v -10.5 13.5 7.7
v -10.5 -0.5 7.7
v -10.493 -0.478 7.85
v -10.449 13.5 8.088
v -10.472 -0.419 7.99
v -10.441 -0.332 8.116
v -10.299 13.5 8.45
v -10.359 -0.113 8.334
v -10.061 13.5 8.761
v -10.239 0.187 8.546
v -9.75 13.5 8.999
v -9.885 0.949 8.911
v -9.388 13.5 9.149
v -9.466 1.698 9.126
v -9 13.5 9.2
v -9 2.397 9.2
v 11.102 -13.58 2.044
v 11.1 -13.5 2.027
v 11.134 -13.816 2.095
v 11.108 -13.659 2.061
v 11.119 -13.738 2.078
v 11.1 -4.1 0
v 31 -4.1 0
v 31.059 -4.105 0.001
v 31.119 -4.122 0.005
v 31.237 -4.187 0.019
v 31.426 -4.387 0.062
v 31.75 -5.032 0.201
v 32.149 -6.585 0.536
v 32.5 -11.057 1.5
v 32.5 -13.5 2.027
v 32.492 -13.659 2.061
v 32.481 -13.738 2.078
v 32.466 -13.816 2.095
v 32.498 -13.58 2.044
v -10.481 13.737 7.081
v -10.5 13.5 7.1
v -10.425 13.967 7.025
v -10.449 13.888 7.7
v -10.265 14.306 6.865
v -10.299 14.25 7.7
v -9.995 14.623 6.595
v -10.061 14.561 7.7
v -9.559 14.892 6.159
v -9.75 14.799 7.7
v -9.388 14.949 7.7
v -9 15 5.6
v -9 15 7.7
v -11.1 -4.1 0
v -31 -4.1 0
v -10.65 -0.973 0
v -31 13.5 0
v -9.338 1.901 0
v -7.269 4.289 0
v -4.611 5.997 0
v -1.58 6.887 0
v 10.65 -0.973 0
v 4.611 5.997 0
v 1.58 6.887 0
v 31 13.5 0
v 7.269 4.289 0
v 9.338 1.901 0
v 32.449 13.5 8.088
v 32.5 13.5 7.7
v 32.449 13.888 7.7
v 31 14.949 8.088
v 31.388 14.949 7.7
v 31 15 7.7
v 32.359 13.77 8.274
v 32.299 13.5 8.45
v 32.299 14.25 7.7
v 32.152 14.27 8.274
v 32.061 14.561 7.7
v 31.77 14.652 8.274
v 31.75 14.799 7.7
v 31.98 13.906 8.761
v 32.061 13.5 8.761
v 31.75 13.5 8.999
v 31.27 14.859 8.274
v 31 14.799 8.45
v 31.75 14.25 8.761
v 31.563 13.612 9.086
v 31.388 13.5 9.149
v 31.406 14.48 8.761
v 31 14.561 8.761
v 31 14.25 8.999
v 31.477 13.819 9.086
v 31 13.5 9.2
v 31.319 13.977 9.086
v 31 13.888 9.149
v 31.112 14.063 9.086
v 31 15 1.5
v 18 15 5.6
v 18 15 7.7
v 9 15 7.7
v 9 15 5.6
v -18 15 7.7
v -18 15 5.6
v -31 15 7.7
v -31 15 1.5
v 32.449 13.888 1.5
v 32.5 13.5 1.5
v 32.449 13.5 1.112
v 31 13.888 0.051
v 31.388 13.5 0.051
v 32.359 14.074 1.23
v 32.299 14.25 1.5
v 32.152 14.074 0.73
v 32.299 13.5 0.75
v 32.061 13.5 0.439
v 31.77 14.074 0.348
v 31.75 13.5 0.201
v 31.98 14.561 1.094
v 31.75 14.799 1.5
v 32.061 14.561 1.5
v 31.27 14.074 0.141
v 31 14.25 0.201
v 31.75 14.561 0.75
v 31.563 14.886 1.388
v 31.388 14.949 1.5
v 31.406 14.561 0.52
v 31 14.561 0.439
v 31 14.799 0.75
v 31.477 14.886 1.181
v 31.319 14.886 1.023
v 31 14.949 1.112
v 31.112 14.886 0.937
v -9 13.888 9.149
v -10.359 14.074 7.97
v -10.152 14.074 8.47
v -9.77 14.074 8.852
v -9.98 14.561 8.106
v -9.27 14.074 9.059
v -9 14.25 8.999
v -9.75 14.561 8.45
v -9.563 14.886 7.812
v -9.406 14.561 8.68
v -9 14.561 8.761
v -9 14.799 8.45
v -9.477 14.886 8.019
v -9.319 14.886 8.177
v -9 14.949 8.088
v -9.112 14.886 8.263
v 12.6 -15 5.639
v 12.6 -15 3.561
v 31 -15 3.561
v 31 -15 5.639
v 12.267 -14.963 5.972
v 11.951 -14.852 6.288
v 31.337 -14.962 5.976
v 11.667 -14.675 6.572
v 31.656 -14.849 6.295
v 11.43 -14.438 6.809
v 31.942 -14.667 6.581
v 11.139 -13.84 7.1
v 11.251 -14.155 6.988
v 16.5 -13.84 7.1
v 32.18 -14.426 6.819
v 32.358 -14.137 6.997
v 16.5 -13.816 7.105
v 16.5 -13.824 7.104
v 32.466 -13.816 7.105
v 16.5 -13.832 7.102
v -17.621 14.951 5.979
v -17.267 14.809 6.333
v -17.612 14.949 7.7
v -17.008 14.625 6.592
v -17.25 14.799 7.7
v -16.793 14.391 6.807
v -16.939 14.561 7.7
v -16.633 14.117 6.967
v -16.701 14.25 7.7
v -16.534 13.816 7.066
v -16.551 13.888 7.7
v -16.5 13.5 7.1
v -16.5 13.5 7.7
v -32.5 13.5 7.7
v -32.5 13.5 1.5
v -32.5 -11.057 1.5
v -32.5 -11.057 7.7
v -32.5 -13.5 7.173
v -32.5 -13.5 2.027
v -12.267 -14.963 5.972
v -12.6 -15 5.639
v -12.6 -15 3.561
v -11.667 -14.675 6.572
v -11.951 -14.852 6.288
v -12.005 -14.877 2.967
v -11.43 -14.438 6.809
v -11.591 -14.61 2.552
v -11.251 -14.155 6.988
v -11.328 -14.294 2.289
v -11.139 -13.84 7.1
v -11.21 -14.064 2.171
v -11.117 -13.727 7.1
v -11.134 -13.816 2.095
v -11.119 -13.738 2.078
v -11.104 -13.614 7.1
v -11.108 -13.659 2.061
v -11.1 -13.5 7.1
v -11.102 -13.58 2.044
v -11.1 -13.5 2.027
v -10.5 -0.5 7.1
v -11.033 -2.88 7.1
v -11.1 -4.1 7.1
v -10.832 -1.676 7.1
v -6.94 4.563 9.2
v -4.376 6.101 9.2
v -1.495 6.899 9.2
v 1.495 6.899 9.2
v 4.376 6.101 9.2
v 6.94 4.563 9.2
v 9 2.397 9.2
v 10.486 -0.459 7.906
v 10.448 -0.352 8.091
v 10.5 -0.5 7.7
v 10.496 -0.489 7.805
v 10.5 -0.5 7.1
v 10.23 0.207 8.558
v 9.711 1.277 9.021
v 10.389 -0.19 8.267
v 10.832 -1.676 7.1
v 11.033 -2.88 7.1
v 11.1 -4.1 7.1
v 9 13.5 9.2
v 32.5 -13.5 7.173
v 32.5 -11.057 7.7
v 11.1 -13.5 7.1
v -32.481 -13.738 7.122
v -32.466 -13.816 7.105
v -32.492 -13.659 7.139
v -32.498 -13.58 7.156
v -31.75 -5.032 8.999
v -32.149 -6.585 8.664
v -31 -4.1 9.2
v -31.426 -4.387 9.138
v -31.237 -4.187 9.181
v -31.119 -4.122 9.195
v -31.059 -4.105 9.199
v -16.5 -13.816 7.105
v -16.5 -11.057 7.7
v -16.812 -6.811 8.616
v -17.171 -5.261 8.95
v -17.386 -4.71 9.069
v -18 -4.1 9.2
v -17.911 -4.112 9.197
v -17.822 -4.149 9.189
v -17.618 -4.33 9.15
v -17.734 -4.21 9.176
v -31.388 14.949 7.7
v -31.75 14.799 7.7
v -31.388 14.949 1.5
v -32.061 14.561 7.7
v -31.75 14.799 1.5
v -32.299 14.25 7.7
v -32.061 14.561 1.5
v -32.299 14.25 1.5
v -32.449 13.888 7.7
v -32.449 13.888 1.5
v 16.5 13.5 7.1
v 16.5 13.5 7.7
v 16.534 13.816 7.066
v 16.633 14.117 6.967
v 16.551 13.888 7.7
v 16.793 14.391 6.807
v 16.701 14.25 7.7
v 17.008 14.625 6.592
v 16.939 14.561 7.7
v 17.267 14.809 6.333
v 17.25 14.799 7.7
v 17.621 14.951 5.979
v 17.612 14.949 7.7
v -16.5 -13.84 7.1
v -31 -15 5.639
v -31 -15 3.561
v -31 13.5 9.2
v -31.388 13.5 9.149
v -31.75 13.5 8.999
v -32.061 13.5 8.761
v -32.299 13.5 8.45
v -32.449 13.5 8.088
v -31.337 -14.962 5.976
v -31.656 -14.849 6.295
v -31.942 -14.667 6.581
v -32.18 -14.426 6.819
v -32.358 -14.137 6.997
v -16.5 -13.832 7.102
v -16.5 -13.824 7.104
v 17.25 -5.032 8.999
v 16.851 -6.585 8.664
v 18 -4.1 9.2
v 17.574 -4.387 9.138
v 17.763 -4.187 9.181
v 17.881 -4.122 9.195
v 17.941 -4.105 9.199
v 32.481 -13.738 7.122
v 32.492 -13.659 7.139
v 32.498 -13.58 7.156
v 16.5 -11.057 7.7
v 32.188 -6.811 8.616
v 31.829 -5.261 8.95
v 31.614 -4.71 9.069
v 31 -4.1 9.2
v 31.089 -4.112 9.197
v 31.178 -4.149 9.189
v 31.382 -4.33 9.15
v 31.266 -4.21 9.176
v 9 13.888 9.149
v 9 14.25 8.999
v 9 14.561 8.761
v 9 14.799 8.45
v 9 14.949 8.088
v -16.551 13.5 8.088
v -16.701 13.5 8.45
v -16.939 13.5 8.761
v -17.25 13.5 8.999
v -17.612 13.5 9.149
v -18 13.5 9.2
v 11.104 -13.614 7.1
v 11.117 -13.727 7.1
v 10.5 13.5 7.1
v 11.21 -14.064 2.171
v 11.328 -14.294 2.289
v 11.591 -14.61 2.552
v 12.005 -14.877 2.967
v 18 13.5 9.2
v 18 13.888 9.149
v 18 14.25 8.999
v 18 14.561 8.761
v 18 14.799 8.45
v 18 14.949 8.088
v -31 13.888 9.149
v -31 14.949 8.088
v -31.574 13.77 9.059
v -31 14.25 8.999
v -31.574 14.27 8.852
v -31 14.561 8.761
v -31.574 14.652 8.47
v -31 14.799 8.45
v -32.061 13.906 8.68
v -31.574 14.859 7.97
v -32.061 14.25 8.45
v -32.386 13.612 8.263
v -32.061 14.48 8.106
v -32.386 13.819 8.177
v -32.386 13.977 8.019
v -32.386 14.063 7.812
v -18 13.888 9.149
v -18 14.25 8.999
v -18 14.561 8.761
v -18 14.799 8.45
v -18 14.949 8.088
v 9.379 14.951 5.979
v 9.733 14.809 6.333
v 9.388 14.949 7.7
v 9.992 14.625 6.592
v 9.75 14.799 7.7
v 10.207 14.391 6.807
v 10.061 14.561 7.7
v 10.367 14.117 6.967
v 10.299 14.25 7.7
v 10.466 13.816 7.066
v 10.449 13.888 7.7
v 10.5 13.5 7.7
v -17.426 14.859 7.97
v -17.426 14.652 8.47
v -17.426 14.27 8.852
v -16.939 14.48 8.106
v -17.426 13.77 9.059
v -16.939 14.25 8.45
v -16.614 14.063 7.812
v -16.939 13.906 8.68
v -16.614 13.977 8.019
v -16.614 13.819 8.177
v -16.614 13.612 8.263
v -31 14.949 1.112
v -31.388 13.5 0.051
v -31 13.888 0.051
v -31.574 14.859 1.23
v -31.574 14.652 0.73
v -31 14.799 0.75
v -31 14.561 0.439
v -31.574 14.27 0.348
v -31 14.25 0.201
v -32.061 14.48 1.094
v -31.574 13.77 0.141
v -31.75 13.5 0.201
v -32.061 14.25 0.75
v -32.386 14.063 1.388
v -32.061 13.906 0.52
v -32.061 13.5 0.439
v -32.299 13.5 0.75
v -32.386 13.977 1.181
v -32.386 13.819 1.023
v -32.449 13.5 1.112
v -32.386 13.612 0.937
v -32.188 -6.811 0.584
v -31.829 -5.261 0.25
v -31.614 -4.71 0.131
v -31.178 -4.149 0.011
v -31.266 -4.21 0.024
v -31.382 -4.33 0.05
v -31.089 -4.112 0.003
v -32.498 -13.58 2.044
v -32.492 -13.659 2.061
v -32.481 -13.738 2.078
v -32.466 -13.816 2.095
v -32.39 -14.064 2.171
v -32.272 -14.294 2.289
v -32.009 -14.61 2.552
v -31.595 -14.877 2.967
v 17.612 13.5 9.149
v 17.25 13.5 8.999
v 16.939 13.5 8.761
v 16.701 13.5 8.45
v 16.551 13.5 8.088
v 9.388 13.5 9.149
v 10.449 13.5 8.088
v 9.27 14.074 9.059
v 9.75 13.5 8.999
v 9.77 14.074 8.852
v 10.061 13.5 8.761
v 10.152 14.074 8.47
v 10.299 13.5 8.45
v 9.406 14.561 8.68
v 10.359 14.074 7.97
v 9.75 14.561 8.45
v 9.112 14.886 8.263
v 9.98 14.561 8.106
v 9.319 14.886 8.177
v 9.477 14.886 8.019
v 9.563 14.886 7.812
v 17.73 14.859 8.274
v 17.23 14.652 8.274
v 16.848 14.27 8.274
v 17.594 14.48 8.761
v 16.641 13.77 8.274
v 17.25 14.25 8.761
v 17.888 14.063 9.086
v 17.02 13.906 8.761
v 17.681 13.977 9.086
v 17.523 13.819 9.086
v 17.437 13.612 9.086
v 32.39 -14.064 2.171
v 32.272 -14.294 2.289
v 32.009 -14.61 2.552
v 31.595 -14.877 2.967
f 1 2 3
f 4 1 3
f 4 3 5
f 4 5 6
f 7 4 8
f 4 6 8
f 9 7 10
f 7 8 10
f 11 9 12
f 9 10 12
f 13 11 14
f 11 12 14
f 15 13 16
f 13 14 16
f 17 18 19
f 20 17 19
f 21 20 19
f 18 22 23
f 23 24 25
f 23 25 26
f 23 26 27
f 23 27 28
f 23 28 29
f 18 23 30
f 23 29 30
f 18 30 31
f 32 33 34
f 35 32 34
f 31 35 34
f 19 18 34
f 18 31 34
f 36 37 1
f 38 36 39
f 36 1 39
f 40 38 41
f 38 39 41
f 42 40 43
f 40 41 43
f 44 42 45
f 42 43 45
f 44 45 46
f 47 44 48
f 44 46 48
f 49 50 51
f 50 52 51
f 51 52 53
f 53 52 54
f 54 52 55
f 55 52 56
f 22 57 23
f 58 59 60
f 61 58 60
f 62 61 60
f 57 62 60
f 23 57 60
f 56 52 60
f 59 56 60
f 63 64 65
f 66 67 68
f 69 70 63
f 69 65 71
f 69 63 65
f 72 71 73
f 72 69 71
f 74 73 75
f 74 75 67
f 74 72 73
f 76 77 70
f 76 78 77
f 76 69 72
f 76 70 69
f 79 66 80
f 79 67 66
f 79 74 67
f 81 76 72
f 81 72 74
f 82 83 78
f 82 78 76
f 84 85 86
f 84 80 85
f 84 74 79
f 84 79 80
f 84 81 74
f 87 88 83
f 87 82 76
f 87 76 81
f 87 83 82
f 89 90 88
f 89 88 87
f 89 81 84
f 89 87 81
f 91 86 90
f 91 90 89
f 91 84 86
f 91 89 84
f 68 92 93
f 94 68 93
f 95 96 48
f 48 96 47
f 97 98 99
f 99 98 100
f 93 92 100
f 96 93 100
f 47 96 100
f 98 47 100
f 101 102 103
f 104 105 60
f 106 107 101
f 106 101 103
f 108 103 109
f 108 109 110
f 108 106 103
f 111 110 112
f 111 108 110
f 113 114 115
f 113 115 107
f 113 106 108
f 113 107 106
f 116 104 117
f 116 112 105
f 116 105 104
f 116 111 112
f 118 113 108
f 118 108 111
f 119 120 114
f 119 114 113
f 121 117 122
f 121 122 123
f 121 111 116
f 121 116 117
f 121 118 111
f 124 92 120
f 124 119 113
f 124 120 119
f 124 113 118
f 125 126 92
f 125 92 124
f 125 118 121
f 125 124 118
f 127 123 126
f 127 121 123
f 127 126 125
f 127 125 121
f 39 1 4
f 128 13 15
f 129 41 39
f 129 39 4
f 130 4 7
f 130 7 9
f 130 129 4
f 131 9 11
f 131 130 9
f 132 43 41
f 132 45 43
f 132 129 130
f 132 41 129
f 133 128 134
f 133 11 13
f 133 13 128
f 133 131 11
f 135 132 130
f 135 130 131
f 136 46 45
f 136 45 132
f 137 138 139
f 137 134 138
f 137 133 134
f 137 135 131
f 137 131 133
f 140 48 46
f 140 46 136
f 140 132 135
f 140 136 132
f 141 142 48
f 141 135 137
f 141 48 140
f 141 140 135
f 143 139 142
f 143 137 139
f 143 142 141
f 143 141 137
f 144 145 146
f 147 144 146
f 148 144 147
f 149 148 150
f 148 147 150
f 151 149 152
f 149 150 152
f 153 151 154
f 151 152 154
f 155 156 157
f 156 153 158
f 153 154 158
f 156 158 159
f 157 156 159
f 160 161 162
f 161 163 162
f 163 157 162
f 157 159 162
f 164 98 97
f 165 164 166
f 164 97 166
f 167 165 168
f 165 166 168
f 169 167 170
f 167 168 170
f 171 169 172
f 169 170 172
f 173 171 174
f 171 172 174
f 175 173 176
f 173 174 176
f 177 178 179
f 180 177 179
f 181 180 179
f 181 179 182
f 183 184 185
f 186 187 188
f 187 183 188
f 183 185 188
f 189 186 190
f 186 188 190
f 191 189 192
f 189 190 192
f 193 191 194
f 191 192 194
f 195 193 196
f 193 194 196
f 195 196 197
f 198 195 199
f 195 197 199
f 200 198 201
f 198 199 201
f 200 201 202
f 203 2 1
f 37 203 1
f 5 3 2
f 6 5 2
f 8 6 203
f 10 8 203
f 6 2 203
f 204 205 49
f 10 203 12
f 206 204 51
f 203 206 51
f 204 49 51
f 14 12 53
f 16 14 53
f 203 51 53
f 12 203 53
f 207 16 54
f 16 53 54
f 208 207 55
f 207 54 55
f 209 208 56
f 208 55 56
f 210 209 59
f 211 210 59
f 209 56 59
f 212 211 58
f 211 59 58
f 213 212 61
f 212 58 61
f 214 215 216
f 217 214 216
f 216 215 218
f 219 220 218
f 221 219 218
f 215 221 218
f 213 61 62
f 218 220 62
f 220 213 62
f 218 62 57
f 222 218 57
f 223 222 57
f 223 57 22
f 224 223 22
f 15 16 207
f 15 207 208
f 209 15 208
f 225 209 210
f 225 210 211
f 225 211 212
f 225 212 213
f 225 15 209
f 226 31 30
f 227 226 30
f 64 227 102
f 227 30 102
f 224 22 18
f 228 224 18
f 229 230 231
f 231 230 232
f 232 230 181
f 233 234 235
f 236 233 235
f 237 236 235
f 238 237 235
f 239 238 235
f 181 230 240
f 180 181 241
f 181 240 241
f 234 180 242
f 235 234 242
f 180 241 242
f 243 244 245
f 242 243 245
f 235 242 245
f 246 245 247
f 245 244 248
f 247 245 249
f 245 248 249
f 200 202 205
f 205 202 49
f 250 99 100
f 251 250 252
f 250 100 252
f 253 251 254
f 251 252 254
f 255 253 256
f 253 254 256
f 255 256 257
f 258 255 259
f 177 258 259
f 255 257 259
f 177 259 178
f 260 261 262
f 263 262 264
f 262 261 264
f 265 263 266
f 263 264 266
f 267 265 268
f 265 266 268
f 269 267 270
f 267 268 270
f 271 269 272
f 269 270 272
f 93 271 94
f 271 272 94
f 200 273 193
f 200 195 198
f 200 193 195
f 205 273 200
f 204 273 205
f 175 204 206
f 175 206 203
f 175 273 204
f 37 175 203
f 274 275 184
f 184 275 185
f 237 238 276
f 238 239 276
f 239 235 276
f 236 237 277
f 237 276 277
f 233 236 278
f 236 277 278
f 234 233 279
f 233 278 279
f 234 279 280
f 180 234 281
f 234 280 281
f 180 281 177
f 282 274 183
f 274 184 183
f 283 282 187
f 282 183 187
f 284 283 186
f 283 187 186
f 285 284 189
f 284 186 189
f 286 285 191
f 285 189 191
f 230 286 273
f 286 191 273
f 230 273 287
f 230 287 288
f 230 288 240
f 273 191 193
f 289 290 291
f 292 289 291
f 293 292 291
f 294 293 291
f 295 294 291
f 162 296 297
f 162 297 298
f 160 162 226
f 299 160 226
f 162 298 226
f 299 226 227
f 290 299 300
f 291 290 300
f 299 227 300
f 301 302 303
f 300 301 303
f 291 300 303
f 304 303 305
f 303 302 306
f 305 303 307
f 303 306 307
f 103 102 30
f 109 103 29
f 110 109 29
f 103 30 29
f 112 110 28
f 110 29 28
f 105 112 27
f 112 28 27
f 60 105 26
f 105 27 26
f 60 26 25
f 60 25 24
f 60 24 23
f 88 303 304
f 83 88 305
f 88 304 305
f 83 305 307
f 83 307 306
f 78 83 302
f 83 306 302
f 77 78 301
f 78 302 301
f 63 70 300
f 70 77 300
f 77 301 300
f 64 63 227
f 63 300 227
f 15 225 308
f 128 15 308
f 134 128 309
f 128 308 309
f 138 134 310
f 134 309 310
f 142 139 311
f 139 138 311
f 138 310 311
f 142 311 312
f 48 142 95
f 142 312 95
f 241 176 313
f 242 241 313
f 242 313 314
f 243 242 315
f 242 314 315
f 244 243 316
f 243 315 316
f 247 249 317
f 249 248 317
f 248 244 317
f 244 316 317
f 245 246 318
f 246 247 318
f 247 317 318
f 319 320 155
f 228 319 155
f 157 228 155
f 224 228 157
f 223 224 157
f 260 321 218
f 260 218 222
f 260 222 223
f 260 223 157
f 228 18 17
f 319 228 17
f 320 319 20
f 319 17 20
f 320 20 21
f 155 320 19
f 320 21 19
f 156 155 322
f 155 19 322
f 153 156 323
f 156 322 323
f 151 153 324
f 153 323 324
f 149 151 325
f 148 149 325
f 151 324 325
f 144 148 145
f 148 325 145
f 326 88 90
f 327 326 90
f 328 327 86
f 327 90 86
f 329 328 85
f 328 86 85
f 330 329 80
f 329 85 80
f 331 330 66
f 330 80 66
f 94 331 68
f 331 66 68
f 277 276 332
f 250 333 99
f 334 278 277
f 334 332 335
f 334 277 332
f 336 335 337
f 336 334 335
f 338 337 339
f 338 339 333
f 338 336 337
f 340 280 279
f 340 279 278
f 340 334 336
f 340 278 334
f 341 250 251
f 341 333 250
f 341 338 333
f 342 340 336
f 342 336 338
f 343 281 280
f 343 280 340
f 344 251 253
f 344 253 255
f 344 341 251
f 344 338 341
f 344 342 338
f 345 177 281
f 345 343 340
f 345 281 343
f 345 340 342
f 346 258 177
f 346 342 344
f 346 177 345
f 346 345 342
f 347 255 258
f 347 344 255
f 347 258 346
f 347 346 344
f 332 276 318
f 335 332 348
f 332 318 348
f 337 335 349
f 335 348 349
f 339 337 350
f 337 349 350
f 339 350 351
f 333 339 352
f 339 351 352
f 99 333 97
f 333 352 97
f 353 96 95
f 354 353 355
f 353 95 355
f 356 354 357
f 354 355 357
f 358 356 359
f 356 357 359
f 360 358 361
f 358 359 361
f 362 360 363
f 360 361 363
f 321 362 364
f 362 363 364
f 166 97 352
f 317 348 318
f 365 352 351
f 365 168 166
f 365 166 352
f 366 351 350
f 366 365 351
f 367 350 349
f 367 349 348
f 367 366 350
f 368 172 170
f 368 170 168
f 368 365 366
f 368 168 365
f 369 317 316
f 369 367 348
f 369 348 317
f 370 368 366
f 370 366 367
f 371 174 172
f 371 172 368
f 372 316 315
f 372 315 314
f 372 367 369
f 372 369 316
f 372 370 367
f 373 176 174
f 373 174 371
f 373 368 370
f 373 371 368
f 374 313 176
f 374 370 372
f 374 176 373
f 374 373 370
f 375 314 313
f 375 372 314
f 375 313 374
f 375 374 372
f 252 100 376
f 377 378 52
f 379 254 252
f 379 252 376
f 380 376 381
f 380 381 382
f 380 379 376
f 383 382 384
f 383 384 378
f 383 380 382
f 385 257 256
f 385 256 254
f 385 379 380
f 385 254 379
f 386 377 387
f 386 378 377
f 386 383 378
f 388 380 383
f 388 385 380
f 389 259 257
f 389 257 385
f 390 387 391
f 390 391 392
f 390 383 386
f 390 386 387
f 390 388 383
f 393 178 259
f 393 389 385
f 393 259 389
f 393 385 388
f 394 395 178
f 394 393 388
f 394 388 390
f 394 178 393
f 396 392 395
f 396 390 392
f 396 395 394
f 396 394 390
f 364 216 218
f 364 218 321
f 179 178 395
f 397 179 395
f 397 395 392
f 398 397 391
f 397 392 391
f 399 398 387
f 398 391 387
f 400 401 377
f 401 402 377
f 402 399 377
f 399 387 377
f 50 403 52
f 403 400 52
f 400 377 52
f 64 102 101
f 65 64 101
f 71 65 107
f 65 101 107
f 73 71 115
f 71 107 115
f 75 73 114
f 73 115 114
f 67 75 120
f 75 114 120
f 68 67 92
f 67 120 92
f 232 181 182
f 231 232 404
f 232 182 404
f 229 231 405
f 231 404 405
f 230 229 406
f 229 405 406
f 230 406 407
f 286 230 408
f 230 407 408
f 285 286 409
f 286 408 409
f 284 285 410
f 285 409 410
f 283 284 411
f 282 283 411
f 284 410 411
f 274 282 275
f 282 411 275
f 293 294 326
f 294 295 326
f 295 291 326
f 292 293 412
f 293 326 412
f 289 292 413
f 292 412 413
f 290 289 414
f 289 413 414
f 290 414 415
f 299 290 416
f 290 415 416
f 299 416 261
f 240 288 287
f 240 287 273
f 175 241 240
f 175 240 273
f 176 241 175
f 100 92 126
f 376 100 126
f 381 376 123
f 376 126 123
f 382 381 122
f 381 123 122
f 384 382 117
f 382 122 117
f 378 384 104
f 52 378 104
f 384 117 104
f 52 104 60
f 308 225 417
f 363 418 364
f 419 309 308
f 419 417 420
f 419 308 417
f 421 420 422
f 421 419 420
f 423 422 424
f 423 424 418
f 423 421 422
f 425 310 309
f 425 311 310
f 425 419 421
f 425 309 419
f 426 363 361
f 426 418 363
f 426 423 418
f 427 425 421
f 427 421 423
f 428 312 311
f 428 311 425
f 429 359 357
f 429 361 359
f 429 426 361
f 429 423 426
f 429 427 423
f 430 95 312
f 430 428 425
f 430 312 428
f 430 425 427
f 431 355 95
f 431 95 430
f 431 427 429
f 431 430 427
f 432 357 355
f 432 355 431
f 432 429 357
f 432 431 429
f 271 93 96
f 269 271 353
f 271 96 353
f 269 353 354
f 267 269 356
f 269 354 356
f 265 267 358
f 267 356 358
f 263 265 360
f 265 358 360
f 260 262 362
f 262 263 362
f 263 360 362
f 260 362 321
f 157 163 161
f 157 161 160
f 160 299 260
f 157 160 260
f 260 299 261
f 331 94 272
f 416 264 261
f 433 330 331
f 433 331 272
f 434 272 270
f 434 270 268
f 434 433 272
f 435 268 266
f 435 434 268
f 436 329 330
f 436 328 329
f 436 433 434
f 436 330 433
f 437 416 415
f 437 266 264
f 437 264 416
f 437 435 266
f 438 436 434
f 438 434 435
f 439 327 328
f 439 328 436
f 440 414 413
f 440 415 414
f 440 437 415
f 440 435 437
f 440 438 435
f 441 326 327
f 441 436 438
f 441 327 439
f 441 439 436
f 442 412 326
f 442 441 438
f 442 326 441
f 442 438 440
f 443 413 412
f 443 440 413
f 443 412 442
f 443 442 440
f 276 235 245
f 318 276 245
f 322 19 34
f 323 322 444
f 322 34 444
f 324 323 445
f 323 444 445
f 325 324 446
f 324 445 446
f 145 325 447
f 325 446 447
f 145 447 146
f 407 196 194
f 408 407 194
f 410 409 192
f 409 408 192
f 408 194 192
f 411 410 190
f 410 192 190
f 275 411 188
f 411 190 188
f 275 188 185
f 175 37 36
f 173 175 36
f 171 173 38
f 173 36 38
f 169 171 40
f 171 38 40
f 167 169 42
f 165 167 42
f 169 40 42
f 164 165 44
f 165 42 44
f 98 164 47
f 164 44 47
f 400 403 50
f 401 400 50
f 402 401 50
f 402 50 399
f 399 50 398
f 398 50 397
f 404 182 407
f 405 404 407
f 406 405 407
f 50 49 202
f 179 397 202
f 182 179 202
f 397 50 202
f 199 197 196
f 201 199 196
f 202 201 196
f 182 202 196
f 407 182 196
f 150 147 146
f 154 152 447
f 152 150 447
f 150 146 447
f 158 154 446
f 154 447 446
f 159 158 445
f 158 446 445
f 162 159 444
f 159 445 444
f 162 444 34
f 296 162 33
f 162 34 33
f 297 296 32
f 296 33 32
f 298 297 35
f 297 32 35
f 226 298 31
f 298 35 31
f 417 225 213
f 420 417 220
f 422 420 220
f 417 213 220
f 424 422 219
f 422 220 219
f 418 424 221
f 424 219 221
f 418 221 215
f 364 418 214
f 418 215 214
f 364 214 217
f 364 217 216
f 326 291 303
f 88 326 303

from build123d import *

# Parameters (mm, degrees)
EXTRUDE_1_DEPTH     = 9.2
SKETCH_3_W          = 6
SKETCH_3_H          = 30
CUT_EXTRUDE_2_DEPTH = 2.1
CUT_EXTRUDE_1_REACH = 69.34
FILLET_1_R          = 1.5


with BuildPart() as part:
    # 凸台-拉伸1: read off the stored shape, not the designer's step
    # 凸台-拉伸1 outline → 凸台-拉伸1 (new body)
    with BuildSketch(Plane.XY):
        with BuildLine():
            Line((11.1, -15), (32.5, -15))
            Line((32.5, -15), (32.5, 15))
            Line((32.5, 15), (-32.5, 15))
            Line((-32.5, 15), (-32.5, -15))
            Line((-32.5, -15), (-11.1, -15))
            Line((-11.1, -15), (-11.1, -4.1))
            ThreePointArc((-11.1, -4.1), (0, 7), (11.1, -4.1))
            Line((11.1, -4.1), (11.1, -15))
        make_face()
    extrude(amount=EXTRUDE_1_DEPTH)

    # 草图3 → 切除-拉伸2 (cut)
    with BuildSketch(Plane.XY.offset(9.2)):
        with Locations((-13.5, 0)):
            Rectangle(SKETCH_3_W, SKETCH_3_H)
        with Locations((13.5, 0)):
            Rectangle(SKETCH_3_W, SKETCH_3_H)
    extrude(amount=-CUT_EXTRUDE_2_DEPTH, mode=Mode.SUBTRACT)

    # 切除-拉伸1: up to this face of the body (flat: up to its plane)
    cut_extrude_1_end = Plane(part.part.faces().sort_by_distance((-32.5, 0, 4.6))[0])
    # 草图2 → 切除-拉伸1 (cut, up to the picked face)
    with BuildSketch(Plane(origin=(32.5, 0, 0), x_dir=(0, 0, -1), z_dir=(1, 0, 0)), mode=Mode.PRIVATE) as cut_extrude_1_sk1:
        Polygon((-6.85, -15), (-9.2, -4.1), (-9.2, -15), align=None)
    cut_extrude_1_tool1 = split(extrude(cut_extrude_1_sk1.sketch, amount=-CUT_EXTRUDE_1_REACH, mode=Mode.PRIVATE), bisect_by=cut_extrude_1_end, keep=Keep.BOTH, mode=Mode.PRIVATE)
    # 草图2 → 切除-拉伸1 (cut, up to the picked face)
    with BuildSketch(Plane(origin=(32.5, 0, 0), x_dir=(0, 0, -1), z_dir=(1, 0, 0)), mode=Mode.PRIVATE) as cut_extrude_1_sk2:
        Polygon((0, -4.1), (-2.35, -15), (0, -15), align=None)
    cut_extrude_1_tool2 = split(extrude(cut_extrude_1_sk2.sketch, amount=-CUT_EXTRUDE_1_REACH, mode=Mode.PRIVATE), bisect_by=cut_extrude_1_end, keep=Keep.BOTH, mode=Mode.PRIVATE)
    add(cut_extrude_1_tool1.solids().sort_by(Axis((32.5, -11.366667, 8.416667), (-1, 0, 0)))[0], mode=Mode.SUBTRACT)
    add(cut_extrude_1_tool2.solids().sort_by(Axis((32.5, -11.366667, 0.783333), (-1, 0, 0)))[0], mode=Mode.SUBTRACT)

    # 圆角1
    # the kernel refuses this fillet: 1.5 mm, written as the material it takes off along each edge
    with BuildSketch(Plane(origin=(-31, 13.5, 7.7), x_dir=(0, 0, 1), z_dir=(-1, 0, 0))) as fillet_1_piece_1_section:
        Polygon((0, 0), (FILLET_1_R, 0), (FILLET_1_R, FILLET_1_R), (0, FILLET_1_R), align=None)
    fillet_1_piece_1 = extrude(amount=FILLET_1_R, mode=Mode.PRIVATE)
    fillet_1_piece_1 = fillet_1_piece_1 - Plane(origin=(-31, 13.5, 7.7), x_dir=(0, -0.7071067811865475, -0.7071067811865475), z_dir=(-1, 0, 0)) * Sphere(FILLET_1_R, mode=Mode.PRIVATE)
    add(fillet_1_piece_1, mode=Mode.SUBTRACT)
    with BuildSketch(Plane(origin=(-31, 13.5, 1.5), x_dir=(0, 1, 0), z_dir=(-1, 0, 0))) as fillet_1_piece_2_section:
        Polygon((0, 0), (FILLET_1_R, 0), (FILLET_1_R, FILLET_1_R), (0, FILLET_1_R), align=None)
    fillet_1_piece_2 = extrude(amount=FILLET_1_R, mode=Mode.PRIVATE)
    fillet_1_piece_2 = fillet_1_piece_2 - Plane(origin=(-31, 13.5, 1.5), x_dir=(0, -0.7071067811865475, 0.7071067811865475), z_dir=(-1, 0, 0)) * Sphere(FILLET_1_R, mode=Mode.PRIVATE)
    add(fillet_1_piece_2, mode=Mode.SUBTRACT)
    with BuildSketch(Plane(origin=(31, 13.5, 1.5), x_dir=(1, 0, 0), z_dir=(0, 1, 0))) as fillet_1_piece_3_section:
        Polygon((0, 0), (FILLET_1_R, 0), (FILLET_1_R, FILLET_1_R), (0, FILLET_1_R), align=None)
    fillet_1_piece_3 = extrude(amount=FILLET_1_R, mode=Mode.PRIVATE)
    fillet_1_piece_3 = fillet_1_piece_3 - Plane(origin=(31, 13.5, 1.5), x_dir=(-0.7071067811865475, 0, 0.7071067811865475), z_dir=(0, 1, 0)) * Sphere(FILLET_1_R, mode=Mode.PRIVATE)
    add(fillet_1_piece_3, mode=Mode.SUBTRACT)
    with BuildSketch(Plane(origin=(31, 13.5, 7.7), x_dir=(0, 1, 0), z_dir=(0, 0, 1))) as fillet_1_piece_4_section:
        Polygon((0, 0), (FILLET_1_R, 0), (FILLET_1_R, -FILLET_1_R), (0, -FILLET_1_R), align=None)
    fillet_1_piece_4 = extrude(amount=FILLET_1_R, mode=Mode.PRIVATE)
    fillet_1_piece_4 = fillet_1_piece_4 - Plane(origin=(31, 13.5, 7.7), x_dir=(-0.7071067811865475, -0.7071067811865475, 0), z_dir=(0, 0, 1)) * Sphere(FILLET_1_R, mode=Mode.PRIVATE)
    add(fillet_1_piece_4, mode=Mode.SUBTRACT)
    with BuildSketch(Plane(origin=(18, 13.5, 7.7), x_dir=(-1, 0, 0), z_dir=(0, 0, 1))) as fillet_1_piece_5_section:
        Polygon((0, 0), (FILLET_1_R, 0), (FILLET_1_R, -FILLET_1_R), (0, -FILLET_1_R), align=None)
    fillet_1_piece_5 = extrude(amount=FILLET_1_R, mode=Mode.PRIVATE)
    fillet_1_piece_5 = fillet_1_piece_5 - Plane(origin=(18, 13.5, 7.7), x_dir=(0.7071067811865476, -0.7071067811865475, 0), z_dir=(0, 0, 1)) * Sphere(FILLET_1_R, mode=Mode.PRIVATE)
    add(fillet_1_piece_5, mode=Mode.SUBTRACT)
    with BuildSketch(Plane(origin=(-18, 13.5, 7.7), x_dir=(0, 1, 0), z_dir=(1, 0, 0))) as fillet_1_piece_6_section:
        Polygon((0, 0), (FILLET_1_R, 0), (FILLET_1_R, FILLET_1_R), (0, FILLET_1_R), align=None)
    fillet_1_piece_6 = extrude(amount=FILLET_1_R, mode=Mode.PRIVATE)
    fillet_1_piece_6 = fillet_1_piece_6 - Plane(origin=(-18, 13.5, 7.7), x_dir=(0, -0.7071067811865475, -0.7071067811865475), z_dir=(1, 0, 0)) * Sphere(FILLET_1_R, mode=Mode.PRIVATE)
    add(fillet_1_piece_6, mode=Mode.SUBTRACT)
    with BuildSketch(Plane(origin=(-9, 13.5, 7.7), x_dir=(0, 0, 1), z_dir=(0, 1, 0))) as fillet_1_piece_7_section:
        Polygon((0, 0), (FILLET_1_R, 0), (FILLET_1_R, -FILLET_1_R), (0, -FILLET_1_R), align=None)
    fillet_1_piece_7 = extrude(amount=FILLET_1_R, mode=Mode.PRIVATE)
    fillet_1_piece_7 = fillet_1_piece_7 - Plane(origin=(-9, 13.5, 7.7), x_dir=(0.7071067811865475, 0, -0.7071067811865475), z_dir=(0, 1, 0)) * Sphere(FILLET_1_R, mode=Mode.PRIVATE)
    add(fillet_1_piece_7, mode=Mode.SUBTRACT)
    with BuildSketch(Plane(origin=(9, 13.5, 7.7), x_dir=(1, 0, 0), z_dir=(0, 1, 0))) as fillet_1_piece_8_section:
        Polygon((0, 0), (FILLET_1_R, 0), (FILLET_1_R, -FILLET_1_R), (0, -FILLET_1_R), align=None)
    fillet_1_piece_8 = extrude(amount=FILLET_1_R, mode=Mode.PRIVATE)
    fillet_1_piece_8 = fillet_1_piece_8 - Plane(origin=(9, 13.5, 7.7), x_dir=(-0.7071067811865475, 0, -0.7071067811865475), z_dir=(0, 1, 0)) * Sphere(FILLET_1_R, mode=Mode.PRIVATE)
    add(fillet_1_piece_8, mode=Mode.SUBTRACT)
    with BuildSketch(Plane(origin=(-8.072322791, -15, 6.85), x_dir=(0, 0.9775391614749971, 0.2107538559143334), z_dir=(-1, 0, 0))) as fillet_1_piece_9:
        with BuildLine():
            CenterArc((FILLET_1_R * 0.807380589126, FILLET_1_R), FILLET_1_R, 192.166533775, 77.833466225)
            Line((-FILLET_1_R * 0.170158572349, FILLET_1_R * 0.789246144086), (0, 0))
            Line((0, 0), (FILLET_1_R * 0.807380589126, 0))
        make_face()
    extrude(amount=27.455354418, mode=Mode.SUBTRACT)
    with BuildSketch(Plane(origin=(-8.072322791, -15, 2.35), x_dir=(0, 0.977539161474997, -0.21075385591433374), z_dir=(-1, 0, 0)), Plane(origin=(35.527677209, -15, 6.85), x_dir=(0, 0, -1), z_dir=(-1, 0, 0)), Plane(origin=(35.527677209, -15, 2.35), x_dir=(0, 0.977539161474997, -0.21075385591433374), z_dir=(-1, 0, 0))) as fillet_1_piece_10:
        with BuildLine():
            CenterArc((FILLET_1_R * 0.807380589126, -FILLET_1_R), FILLET_1_R, 90, 77.833466225)
            Line((-FILLET_1_R * 0.170158572349, -FILLET_1_R * 0.789246144086), (0, 0))
            Line((0, 0), (FILLET_1_R * 0.807380589126, 0))
        make_face()
    extrude(amount=27.455354418, mode=Mode.SUBTRACT)
    with BuildSketch(Plane(origin=(-11.1, -15, -1.4), x_dir=(0, 1, 0), z_dir=(0, 0, 1))) as fillet_1_piece_11:
        with BuildLine():
            CenterArc((FILLET_1_R, FILLET_1_R), FILLET_1_R, 180, 90)
            Line((0, FILLET_1_R), (0, 0))
            Line((0, 0), (FILLET_1_R, 0))
        make_face()
    extrude(amount=12, mode=Mode.SUBTRACT)
    with BuildSketch(Plane(origin=(11.1, -15, -1.4), x_dir=(0, 1, 0), z_dir=(0, 0, 1)), Plane(origin=(32.5, -15, -1.4), x_dir=(-1, 0, 0), z_dir=(0, 0, 1)), Plane(origin=(-32.5, -15, -1.4), x_dir=(0, 1, 0), z_dir=(0, 0, 1))) as fillet_1_piece_12:
        with BuildLine():
            CenterArc((FILLET_1_R, -FILLET_1_R), FILLET_1_R, 90, 90)
            Line((0, -FILLET_1_R), (0, 0))
            Line((0, 0), (FILLET_1_R, 0))
        make_face()
    extrude(amount=12, mode=Mode.SUBTRACT)
    with BuildSketch(Plane(origin=(-32.5, 13.5, 9.2), x_dir=(0, 0, -1), z_dir=(0, -1, 0)), Plane(origin=(-32.5, 13.5, 0), x_dir=(1, 0, 0), z_dir=(0, -1, 0)), Plane(origin=(32.5, -15.35, 9.2), x_dir=(0, 0, -1), z_dir=(0, 1, 0)), Plane(origin=(-16.5, 13.5, 9.2), x_dir=(-1, 0, 0), z_dir=(0, -1, 0))) as fillet_1_piece_13:
        with BuildLine():
            CenterArc((FILLET_1_R, FILLET_1_R), FILLET_1_R, 180, 90)
            Line((0, FILLET_1_R), (0, 0))
            Line((0, 0), (FILLET_1_R, 0))
        make_face()
    extrude(amount=28.85, mode=Mode.SUBTRACT)
    with BuildSketch(Plane(origin=(32.5, -15.35, 0), x_dir=(0, 0, 1), z_dir=(0, 1, 0)), Plane(origin=(16.5, 13.5, 9.2), x_dir=(1, 0, 0), z_dir=(0, -1, 0))) as fillet_1_piece_14:
        with BuildLine():
            CenterArc((FILLET_1_R, -FILLET_1_R), FILLET_1_R, 90, 90)
            Line((0, -FILLET_1_R), (0, 0))
            Line((0, 0), (FILLET_1_R, 0))
        make_face()
    extrude(amount=28.85, mode=Mode.SUBTRACT)
    with BuildSketch(Plane(origin=(32.5, 15, 1.5), x_dir=(0, -1, 0), z_dir=(0, 0, 1)), Plane(origin=(-32.5, 15, 1.5), x_dir=(1, 0, 0), z_dir=(0, 0, 1))) as fillet_1_piece_15:
        with BuildLine():
            CenterArc((FILLET_1_R, -FILLET_1_R), FILLET_1_R, 90, 90)
            Line((0, -FILLET_1_R), (0, 0))
            Line((0, 0), (FILLET_1_R, 0))
        make_face()
    extrude(amount=6.2, mode=Mode.SUBTRACT)
    with BuildSketch(Plane(origin=(31, 15, 0), x_dir=(0, -1, 0), z_dir=(-1, 0, 0))) as fillet_1_piece_16:
        with BuildLine():
            CenterArc((FILLET_1_R, FILLET_1_R), FILLET_1_R, 180, 90)
            Line((0, FILLET_1_R), (0, 0))
            Line((0, 0), (FILLET_1_R, 0))
        make_face()
    extrude(amount=62, mode=Mode.SUBTRACT)
    with BuildSketch(Plane(origin=(31, 15, 9.2), x_dir=(0, -1, 0), z_dir=(-1, 0, 0))) as fillet_1_piece_17:
        with BuildLine():
            CenterArc((FILLET_1_R, -FILLET_1_R), FILLET_1_R, 90, 90)
            Line((0, -FILLET_1_R), (0, 0))
            Line((0, 0), (FILLET_1_R, 0))
        make_face()
    extrude(amount=13, mode=Mode.SUBTRACT)
    with BuildSketch(Plane(origin=(-18, 15, 9.2), x_dir=(0, 0, -1), z_dir=(-1, 0, 0))) as fillet_1_piece_18:
        with BuildLine():
            CenterArc((FILLET_1_R, FILLET_1_R), FILLET_1_R, 180, 90)
            Line((0, FILLET_1_R), (0, 0))
            Line((0, 0), (FILLET_1_R, 0))
        make_face()
    extrude(amount=13, mode=Mode.SUBTRACT)
    with BuildSketch(Plane(origin=(-10.5, -4.25, 9.2), x_dir=(1, 0, 0), z_dir=(0, 1, 0)), Plane(origin=(10.5, -4.25, 9.2), x_dir=(0, 0, -1), z_dir=(0, 1, 0))) as fillet_1_piece_19:
        with BuildLine():
            CenterArc((FILLET_1_R, FILLET_1_R), FILLET_1_R, 180, 90)
            Line((0, FILLET_1_R), (0, 0))
            Line((0, 0), (FILLET_1_R, 0))
        make_face()
    extrude(amount=17.75, mode=Mode.SUBTRACT)
    with BuildSketch(Plane(origin=(16.5, 15, 7.7), x_dir=(0, -1, 0), z_dir=(0, 0, -1)), Plane(origin=(10.5, 15, 7.7), x_dir=(-1, 0, 0), z_dir=(0, 0, -1)), Plane(origin=(-16.5, 15, 7.7), x_dir=(-1, 0, 0), z_dir=(0, 0, -1))) as fillet_1_piece_20:
        with BuildLine():
            CenterArc((FILLET_1_R, -FILLET_1_R), FILLET_1_R, 90, 90)
            Line((0, -FILLET_1_R), (0, 0))
            Line((0, 0), (FILLET_1_R, 0))
        make_face()
    extrude(amount=0.6, mode=Mode.SUBTRACT)
    with BuildSketch(Plane(origin=(10.5, 15, 7.1), x_dir=(0, -1, 0), z_dir=(1, 0, 0)), Plane(origin=(-10.5, 15, 7.1), x_dir=(0, 0, -1), z_dir=(-1, 0, 0))) as fillet_1_piece_21:
        with BuildLine():
            CenterArc((FILLET_1_R, FILLET_1_R), FILLET_1_R, 180, 90)
            Line((0, FILLET_1_R), (0, 0))
            Line((0, 0), (FILLET_1_R, 0))
        make_face()
    extrude(amount=6, mode=Mode.SUBTRACT)
    with BuildSketch(Plane(origin=(9, 15, 9.2), x_dir=(0, 0, -1), z_dir=(-1, 0, 0))) as fillet_1_piece_22:
        with BuildLine():
            CenterArc((FILLET_1_R, FILLET_1_R), FILLET_1_R, 180, 90)
            Line((0, FILLET_1_R), (0, 0))
            Line((0, 0), (FILLET_1_R, 0))
        make_face()
    extrude(amount=18, mode=Mode.SUBTRACT)
    with BuildSketch(Plane(origin=(-10.5, 15, 7.7), x_dir=(1, 0, 0), z_dir=(0, 0, -1))) as fillet_1_piece_23:
        with BuildLine():
            CenterArc((FILLET_1_R, FILLET_1_R), FILLET_1_R, 180, 90)
            Line((0, FILLET_1_R), (0, 0))
            Line((0, 0), (FILLET_1_R, 0))
        make_face()
    extrude(amount=0.6, mode=Mode.SUBTRACT)
    with BuildSketch(Plane(origin=(10.5, 15, 7.1), x_dir=(0, -1, 0), z_dir=(1, 0, 0))) as fillet_1_piece_24a_section:
        with BuildLine():
            CenterArc((FILLET_1_R, FILLET_1_R), FILLET_1_R, 180, 90)
            Line((0, FILLET_1_R), (0, 0))
            Line((0, 0), (FILLET_1_R, 0))
        make_face()
    fillet_1_piece_24a = extrude(amount=9.75, mode=Mode.PRIVATE)
    fillet_1_piece_24a = split(fillet_1_piece_24a, bisect_by=Plane(origin=(16.5, 15, 7.1), z_dir=(1, 0, 0)), keep=Keep.TOP, mode=Mode.PRIVATE)
    with BuildSketch(Plane(origin=(16.5, 15, 7.7), x_dir=(0, -1, 0), z_dir=(0, 0, -1))) as fillet_1_piece_24b_section:
        with BuildLine():
            CenterArc((FILLET_1_R, -FILLET_1_R), FILLET_1_R, 90, 90)
            Line((0, -FILLET_1_R), (0, 0))
            Line((0, 0), (FILLET_1_R, 0))
        make_face()
    fillet_1_piece_24b = extrude(amount=4.35, mode=Mode.PRIVATE)
    fillet_1_piece_24b = split(fillet_1_piece_24b, bisect_by=Plane(origin=(16.5, 15, 7.1), z_dir=(0, 0, -1)), keep=Keep.TOP, mode=Mode.PRIVATE)
    fillet_1_piece_24 = fillet_1_piece_24a & fillet_1_piece_24b
    add(fillet_1_piece_24, mode=Mode.SUBTRACT)
    with BuildSketch(Plane(origin=(6.75, 15, 7.1), x_dir=(0, -1, 0), z_dir=(1, 0, 0))) as fillet_1_piece_25a_section:
        with BuildLine():
            CenterArc((FILLET_1_R, FILLET_1_R), FILLET_1_R, 180, 90)
            Line((0, FILLET_1_R), (0, 0))
            Line((0, 0), (FILLET_1_R, 0))
        make_face()
    fillet_1_piece_25a = extrude(amount=9.75, mode=Mode.PRIVATE)
    fillet_1_piece_25a = split(fillet_1_piece_25a, bisect_by=Plane(origin=(10.5, 15, 7.1), z_dir=(-1, 0, 0)), keep=Keep.TOP, mode=Mode.PRIVATE)
    with BuildSketch(Plane(origin=(10.5, 15, 7.7), x_dir=(-1, 0, 0), z_dir=(0, 0, -1))) as fillet_1_piece_25b_section:
        with BuildLine():
            CenterArc((FILLET_1_R, -FILLET_1_R), FILLET_1_R, 90, 90)
            Line((0, -FILLET_1_R), (0, 0))
            Line((0, 0), (FILLET_1_R, 0))
        make_face()
    fillet_1_piece_25b = extrude(amount=4.35, mode=Mode.PRIVATE)
    fillet_1_piece_25b = split(fillet_1_piece_25b, bisect_by=Plane(origin=(10.5, 15, 7.1), z_dir=(0, 0, -1)), keep=Keep.TOP, mode=Mode.PRIVATE)
    fillet_1_piece_25 = fillet_1_piece_25a & fillet_1_piece_25b
    add(fillet_1_piece_25, mode=Mode.SUBTRACT)
    with BuildSketch(Plane(origin=(-6.75, 15, 7.1), x_dir=(0, 0, -1), z_dir=(-1, 0, 0))) as fillet_1_piece_26a_section:
        with BuildLine():
            CenterArc((FILLET_1_R, FILLET_1_R), FILLET_1_R, 180, 90)
            Line((0, FILLET_1_R), (0, 0))
            Line((0, 0), (FILLET_1_R, 0))
        make_face()
    fillet_1_piece_26a = extrude(amount=9.75, mode=Mode.PRIVATE)
    fillet_1_piece_26a = split(fillet_1_piece_26a, bisect_by=Plane(origin=(-10.5, 15, 7.1), z_dir=(1, 0, 0)), keep=Keep.TOP, mode=Mode.PRIVATE)
    with BuildSketch(Plane(origin=(-10.5, 15, 7.7), x_dir=(1, 0, 0), z_dir=(0, 0, -1))) as fillet_1_piece_26b_section:
        with BuildLine():
            CenterArc((FILLET_1_R, FILLET_1_R), FILLET_1_R, 180, 90)
            Line((0, FILLET_1_R), (0, 0))
            Line((0, 0), (FILLET_1_R, 0))
        make_face()
    fillet_1_piece_26b = extrude(amount=4.35, mode=Mode.PRIVATE)
    fillet_1_piece_26b = split(fillet_1_piece_26b, bisect_by=Plane(origin=(-10.5, 15, 7.1), z_dir=(0, 0, -1)), keep=Keep.TOP, mode=Mode.PRIVATE)
    fillet_1_piece_26 = fillet_1_piece_26a & fillet_1_piece_26b
    add(fillet_1_piece_26, mode=Mode.SUBTRACT)
    with BuildSketch(Plane(origin=(-16.5, 15, 7.7), x_dir=(-1, 0, 0), z_dir=(0, 0, -1))) as fillet_1_piece_27a_section:
        with BuildLine():
            CenterArc((FILLET_1_R, -FILLET_1_R), FILLET_1_R, 90, 90)
            Line((0, -FILLET_1_R), (0, 0))
            Line((0, 0), (FILLET_1_R, 0))
        make_face()
    fillet_1_piece_27a = extrude(amount=4.35, mode=Mode.PRIVATE)
    fillet_1_piece_27a = split(fillet_1_piece_27a, bisect_by=Plane(origin=(-16.5, 15, 7.1), z_dir=(0, 0, -1)), keep=Keep.TOP, mode=Mode.PRIVATE)
    with BuildSketch(Plane(origin=(-10.5, 15, 7.1), x_dir=(0, 0, -1), z_dir=(-1, 0, 0))) as fillet_1_piece_27b_section:
        with BuildLine():
            CenterArc((FILLET_1_R, FILLET_1_R), FILLET_1_R, 180, 90)
            Line((0, FILLET_1_R), (0, 0))
            Line((0, 0), (FILLET_1_R, 0))
        make_face()
    fillet_1_piece_27b = extrude(amount=9.75, mode=Mode.PRIVATE)
    fillet_1_piece_27b = split(fillet_1_piece_27b, bisect_by=Plane(origin=(-16.5, 15, 7.1), z_dir=(-1, 0, 0)), keep=Keep.TOP, mode=Mode.PRIVATE)
    fillet_1_piece_27 = fillet_1_piece_27a & fillet_1_piece_27b
    add(fillet_1_piece_27, mode=Mode.SUBTRACT)


solid = part.part
